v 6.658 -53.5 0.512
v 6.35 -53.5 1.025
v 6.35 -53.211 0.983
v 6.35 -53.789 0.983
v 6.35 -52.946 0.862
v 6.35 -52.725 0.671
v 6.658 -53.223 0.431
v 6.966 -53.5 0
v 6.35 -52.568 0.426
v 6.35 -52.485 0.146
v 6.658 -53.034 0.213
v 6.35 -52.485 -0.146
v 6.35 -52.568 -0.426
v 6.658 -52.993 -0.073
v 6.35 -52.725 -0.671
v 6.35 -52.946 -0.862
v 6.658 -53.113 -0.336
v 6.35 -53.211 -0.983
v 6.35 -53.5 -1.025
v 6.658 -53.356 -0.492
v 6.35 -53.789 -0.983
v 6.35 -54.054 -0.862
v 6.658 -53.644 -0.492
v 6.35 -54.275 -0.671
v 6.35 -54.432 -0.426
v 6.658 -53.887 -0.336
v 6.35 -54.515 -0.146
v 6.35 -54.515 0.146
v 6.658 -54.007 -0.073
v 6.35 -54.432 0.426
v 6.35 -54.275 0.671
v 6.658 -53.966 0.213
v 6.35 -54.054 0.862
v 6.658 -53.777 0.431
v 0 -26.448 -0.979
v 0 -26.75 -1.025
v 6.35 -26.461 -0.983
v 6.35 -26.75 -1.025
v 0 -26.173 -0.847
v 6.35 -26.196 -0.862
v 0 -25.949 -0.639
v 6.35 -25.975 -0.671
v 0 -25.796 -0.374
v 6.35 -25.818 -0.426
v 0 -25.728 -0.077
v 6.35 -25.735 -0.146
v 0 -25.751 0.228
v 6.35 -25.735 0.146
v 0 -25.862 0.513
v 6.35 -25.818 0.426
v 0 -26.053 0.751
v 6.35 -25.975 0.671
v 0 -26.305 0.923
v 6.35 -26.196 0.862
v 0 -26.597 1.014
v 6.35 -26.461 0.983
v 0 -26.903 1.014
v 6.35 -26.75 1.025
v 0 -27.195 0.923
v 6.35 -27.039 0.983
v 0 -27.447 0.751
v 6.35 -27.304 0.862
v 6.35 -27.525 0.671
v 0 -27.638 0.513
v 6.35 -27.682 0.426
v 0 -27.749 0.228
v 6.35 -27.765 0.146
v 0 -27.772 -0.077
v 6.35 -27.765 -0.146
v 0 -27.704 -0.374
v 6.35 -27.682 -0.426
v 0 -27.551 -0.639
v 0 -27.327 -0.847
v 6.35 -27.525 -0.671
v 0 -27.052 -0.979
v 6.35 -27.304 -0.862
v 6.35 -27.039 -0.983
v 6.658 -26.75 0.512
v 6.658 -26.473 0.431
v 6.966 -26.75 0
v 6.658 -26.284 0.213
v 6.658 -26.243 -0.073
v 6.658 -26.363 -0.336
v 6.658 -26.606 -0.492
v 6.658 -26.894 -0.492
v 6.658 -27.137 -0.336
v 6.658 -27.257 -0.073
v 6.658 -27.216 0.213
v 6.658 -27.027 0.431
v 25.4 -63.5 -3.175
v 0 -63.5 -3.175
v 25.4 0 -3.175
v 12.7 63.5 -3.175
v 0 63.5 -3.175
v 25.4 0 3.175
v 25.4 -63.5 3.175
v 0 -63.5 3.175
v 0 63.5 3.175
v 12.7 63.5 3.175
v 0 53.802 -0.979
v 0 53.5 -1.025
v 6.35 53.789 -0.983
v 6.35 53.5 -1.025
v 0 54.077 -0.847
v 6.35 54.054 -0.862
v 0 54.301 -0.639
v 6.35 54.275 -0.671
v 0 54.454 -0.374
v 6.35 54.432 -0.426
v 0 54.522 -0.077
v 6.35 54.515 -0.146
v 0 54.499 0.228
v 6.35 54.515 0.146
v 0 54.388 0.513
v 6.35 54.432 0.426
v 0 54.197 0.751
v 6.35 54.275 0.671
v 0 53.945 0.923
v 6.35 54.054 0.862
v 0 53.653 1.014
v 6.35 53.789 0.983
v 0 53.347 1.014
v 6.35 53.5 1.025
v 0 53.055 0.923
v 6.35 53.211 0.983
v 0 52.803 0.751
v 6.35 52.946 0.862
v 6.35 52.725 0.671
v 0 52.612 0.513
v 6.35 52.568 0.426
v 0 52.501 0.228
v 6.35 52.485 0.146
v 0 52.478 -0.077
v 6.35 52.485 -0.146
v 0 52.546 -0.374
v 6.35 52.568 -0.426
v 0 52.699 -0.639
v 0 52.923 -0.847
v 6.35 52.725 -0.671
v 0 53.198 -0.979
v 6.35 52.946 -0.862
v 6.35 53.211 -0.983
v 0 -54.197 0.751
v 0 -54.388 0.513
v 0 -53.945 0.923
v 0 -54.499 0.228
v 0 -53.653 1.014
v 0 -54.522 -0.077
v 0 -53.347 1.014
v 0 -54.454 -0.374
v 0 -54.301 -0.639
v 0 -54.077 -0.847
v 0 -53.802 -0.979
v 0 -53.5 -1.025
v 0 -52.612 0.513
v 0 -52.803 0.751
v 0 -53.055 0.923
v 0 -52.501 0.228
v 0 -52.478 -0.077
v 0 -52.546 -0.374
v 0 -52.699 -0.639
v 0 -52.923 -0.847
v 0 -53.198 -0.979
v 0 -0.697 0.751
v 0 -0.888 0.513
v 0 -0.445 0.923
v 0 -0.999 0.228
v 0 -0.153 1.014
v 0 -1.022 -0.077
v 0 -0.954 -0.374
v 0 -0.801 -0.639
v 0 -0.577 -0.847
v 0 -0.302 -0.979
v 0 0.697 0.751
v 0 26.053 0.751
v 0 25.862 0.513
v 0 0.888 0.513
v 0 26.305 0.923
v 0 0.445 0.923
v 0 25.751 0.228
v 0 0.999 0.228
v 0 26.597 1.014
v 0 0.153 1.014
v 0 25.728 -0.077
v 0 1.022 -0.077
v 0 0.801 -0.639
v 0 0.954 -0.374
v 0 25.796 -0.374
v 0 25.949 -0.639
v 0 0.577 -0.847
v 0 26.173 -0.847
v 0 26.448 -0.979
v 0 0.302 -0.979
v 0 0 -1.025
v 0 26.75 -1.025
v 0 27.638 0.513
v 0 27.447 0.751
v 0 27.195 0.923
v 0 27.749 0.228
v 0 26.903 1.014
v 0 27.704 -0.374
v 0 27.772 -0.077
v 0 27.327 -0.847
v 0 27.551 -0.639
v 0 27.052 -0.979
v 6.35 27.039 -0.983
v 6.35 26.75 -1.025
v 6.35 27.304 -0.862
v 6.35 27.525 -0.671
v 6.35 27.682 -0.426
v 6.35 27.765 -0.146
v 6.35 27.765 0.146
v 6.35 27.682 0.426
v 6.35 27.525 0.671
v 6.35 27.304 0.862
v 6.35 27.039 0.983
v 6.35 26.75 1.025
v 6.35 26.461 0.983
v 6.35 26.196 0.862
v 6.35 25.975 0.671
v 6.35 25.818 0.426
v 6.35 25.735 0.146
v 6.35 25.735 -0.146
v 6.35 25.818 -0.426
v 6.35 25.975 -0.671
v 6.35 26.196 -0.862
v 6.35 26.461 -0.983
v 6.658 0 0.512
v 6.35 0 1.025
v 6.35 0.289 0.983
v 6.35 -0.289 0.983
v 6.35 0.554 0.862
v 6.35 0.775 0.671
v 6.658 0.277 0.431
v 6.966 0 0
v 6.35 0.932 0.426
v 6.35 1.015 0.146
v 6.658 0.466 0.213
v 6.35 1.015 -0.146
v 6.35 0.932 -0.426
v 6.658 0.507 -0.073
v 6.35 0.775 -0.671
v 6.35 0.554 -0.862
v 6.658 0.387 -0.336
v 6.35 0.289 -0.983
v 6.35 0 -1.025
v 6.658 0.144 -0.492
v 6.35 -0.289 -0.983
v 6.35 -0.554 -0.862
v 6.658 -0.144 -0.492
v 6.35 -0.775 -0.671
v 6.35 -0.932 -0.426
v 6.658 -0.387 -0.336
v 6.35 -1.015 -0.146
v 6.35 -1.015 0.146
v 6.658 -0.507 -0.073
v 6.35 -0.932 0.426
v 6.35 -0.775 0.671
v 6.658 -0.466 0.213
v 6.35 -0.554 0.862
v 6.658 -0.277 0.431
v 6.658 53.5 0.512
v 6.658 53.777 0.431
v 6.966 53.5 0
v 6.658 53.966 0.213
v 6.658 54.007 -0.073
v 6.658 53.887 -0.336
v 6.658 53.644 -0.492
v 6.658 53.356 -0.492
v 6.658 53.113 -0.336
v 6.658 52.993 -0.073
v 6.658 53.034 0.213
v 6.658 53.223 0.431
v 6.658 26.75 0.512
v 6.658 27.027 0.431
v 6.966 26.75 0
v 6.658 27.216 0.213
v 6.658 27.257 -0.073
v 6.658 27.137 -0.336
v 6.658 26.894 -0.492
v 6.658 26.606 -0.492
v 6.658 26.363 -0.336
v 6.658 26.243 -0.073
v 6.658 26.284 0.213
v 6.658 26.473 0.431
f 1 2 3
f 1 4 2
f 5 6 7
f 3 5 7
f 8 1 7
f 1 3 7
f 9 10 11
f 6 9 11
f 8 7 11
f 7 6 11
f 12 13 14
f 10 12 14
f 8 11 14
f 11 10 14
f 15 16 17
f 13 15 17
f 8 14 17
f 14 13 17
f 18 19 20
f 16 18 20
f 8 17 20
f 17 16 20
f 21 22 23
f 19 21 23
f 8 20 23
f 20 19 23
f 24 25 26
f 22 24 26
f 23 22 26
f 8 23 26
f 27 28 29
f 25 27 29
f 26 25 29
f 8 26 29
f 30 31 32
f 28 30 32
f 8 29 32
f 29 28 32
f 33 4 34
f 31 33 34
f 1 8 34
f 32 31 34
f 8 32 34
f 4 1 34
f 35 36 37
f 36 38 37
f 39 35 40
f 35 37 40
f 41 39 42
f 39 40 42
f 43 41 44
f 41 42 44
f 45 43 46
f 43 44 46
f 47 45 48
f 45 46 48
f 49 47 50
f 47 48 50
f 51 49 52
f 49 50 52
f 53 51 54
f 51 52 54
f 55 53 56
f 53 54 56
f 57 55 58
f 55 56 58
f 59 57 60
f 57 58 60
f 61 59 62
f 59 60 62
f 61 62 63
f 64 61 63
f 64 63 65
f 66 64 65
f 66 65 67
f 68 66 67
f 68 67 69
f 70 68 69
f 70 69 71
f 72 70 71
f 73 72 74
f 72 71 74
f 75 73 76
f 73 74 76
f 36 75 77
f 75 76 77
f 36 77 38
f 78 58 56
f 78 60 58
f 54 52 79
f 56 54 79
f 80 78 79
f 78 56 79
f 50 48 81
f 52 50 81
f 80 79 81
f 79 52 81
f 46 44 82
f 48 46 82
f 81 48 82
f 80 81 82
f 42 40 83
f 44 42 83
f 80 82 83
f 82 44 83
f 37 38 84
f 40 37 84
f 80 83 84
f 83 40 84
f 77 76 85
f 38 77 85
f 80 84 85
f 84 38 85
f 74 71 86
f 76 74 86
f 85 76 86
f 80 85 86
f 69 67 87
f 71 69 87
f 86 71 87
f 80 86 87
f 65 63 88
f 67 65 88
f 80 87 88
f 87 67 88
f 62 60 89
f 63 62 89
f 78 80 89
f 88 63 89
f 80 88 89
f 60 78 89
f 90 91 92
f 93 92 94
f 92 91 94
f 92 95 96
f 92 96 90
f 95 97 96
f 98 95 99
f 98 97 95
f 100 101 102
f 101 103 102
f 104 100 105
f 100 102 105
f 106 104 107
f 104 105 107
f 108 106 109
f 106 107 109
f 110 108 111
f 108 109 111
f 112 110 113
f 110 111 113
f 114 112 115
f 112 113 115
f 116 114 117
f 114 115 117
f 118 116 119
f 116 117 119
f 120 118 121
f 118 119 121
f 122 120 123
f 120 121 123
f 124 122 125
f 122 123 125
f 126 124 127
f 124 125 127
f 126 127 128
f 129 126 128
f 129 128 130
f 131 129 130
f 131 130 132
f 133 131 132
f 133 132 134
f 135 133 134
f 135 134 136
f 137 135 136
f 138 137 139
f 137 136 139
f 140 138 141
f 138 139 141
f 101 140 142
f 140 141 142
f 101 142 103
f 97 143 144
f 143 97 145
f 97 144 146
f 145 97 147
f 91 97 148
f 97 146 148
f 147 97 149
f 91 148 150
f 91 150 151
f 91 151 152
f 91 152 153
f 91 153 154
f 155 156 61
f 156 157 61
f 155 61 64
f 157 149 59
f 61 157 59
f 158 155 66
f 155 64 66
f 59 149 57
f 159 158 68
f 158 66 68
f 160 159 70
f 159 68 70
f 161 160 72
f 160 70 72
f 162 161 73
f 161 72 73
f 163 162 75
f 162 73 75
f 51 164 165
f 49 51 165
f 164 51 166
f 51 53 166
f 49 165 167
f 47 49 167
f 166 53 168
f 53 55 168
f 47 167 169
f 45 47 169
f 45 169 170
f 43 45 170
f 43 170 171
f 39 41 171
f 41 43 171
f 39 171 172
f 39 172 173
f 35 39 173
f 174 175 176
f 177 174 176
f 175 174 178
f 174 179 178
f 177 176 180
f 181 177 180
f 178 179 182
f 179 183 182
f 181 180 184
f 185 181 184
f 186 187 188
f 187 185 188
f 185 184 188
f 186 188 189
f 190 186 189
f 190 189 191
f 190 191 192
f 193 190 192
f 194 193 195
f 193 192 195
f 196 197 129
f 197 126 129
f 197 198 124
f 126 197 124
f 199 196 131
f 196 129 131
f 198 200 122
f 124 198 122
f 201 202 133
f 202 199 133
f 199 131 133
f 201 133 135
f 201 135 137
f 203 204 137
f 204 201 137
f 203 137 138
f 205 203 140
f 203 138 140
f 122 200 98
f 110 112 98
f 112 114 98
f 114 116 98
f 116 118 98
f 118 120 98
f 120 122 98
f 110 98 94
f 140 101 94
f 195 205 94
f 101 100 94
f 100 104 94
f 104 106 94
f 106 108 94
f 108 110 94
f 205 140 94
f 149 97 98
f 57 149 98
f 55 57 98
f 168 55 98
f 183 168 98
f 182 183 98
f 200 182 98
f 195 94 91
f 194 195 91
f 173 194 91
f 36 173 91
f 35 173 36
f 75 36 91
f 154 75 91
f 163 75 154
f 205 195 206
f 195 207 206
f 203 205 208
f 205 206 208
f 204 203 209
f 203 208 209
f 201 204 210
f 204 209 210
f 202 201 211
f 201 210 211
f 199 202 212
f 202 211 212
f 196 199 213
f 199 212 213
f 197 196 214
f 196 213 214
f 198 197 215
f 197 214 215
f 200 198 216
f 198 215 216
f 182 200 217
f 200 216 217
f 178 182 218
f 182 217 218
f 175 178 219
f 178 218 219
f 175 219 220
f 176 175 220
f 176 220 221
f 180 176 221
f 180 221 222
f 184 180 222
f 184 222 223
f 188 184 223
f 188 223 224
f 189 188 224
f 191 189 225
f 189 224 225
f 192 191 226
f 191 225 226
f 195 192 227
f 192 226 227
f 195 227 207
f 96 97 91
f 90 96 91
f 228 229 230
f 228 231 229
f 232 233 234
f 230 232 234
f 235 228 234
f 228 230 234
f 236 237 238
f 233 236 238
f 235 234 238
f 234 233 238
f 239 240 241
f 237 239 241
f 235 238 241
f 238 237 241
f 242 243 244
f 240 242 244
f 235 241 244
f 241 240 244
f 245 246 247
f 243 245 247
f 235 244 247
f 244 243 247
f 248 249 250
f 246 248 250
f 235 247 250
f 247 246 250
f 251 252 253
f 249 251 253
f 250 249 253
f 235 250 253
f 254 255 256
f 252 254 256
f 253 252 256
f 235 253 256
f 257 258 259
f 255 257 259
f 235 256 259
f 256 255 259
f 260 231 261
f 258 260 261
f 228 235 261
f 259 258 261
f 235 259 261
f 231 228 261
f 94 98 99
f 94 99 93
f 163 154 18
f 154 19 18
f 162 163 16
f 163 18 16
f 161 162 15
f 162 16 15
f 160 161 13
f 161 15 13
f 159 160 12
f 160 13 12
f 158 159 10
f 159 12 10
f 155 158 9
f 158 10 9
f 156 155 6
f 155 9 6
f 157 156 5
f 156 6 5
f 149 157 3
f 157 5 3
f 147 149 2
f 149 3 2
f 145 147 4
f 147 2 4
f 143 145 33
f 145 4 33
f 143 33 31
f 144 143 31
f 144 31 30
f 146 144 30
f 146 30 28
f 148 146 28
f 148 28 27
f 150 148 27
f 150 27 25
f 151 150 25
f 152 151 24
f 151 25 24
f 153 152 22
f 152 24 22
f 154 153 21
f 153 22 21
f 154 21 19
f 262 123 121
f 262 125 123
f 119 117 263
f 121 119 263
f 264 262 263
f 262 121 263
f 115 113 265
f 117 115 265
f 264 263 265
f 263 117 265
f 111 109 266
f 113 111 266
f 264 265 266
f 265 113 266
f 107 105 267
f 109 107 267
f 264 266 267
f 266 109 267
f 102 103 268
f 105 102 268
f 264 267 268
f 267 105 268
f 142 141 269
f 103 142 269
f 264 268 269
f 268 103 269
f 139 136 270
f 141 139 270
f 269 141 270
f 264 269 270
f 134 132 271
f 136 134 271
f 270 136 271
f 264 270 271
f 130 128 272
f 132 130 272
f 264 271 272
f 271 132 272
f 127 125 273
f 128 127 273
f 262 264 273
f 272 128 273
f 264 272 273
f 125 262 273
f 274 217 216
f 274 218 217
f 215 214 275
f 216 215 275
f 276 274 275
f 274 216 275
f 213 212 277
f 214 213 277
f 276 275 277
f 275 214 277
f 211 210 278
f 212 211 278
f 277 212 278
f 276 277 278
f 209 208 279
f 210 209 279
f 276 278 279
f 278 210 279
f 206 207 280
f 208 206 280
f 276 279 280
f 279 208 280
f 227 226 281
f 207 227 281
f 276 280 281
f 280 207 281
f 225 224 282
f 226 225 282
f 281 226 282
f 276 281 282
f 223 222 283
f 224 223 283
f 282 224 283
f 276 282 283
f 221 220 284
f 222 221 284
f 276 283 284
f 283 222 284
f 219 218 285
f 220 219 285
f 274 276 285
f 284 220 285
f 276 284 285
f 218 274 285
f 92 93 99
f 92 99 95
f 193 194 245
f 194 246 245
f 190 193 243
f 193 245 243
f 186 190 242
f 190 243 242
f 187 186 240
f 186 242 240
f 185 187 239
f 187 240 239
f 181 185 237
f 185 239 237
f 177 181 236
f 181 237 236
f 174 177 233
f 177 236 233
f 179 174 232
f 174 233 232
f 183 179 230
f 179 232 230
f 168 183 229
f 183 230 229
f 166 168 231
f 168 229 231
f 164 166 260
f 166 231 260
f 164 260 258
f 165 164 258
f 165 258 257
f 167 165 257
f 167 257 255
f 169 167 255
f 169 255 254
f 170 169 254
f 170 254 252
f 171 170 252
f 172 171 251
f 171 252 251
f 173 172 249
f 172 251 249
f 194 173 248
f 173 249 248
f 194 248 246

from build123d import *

# Parameters (mm, degrees)
SKETCH1_W                    = 6.35
SKETCH1_H                    = 127
BOSS_EXTRUDE1_DEPTH          = 25.4
M2_5X0_45_TAPPED_HOLE1_D     = 2.05
M2_5X0_45_TAPPED_HOLE1_DEPTH = 6.35
M2_5X0_45_TAPPED_HOLE1_TIP   = 0.615882135
CUT_EXTRUDE1_DEPTH           = 69.685751798
CUT_EXTRUDE1_DEPTH_BACK      = 69.685751798


with BuildPart() as part:
    # Sketch1 → Boss-Extrude1 (new body)
    with BuildSketch(Plane(origin=(0, 0, 0), x_dir=(0, 0, -1), z_dir=(1, 0, 0))):
        Rectangle(SKETCH1_W, SKETCH1_H)
    extrude(amount=BOSS_EXTRUDE1_DEPTH)

    # M2.5x0.45 Tapped Hole1
    with Locations(Plane.ZY):
        with Locations((0, 53.5), (0, 26.75), (0, 0), (0, -26.75), (0, -53.5)):
            Hole(M2_5X0_45_TAPPED_HOLE1_D / 2, depth=M2_5X0_45_TAPPED_HOLE1_DEPTH)
            with Locations((0, 0, -(M2_5X0_45_TAPPED_HOLE1_DEPTH + M2_5X0_45_TAPPED_HOLE1_TIP / 2))):  # 118° drill point
                Cone(0, M2_5X0_45_TAPPED_HOLE1_D / 2, M2_5X0_45_TAPPED_HOLE1_TIP, mode=Mode.SUBTRACT)

    # Sketch4 → Cut-Extrude1 (cut, two sides: drawn at the far end of the back side and taken through both)
    with BuildSketch(Plane.XY.offset(3.175).offset(-CUT_EXTRUDE1_DEPTH_BACK)):
        Polygon((25.4, 63.5), (12.7, 63.5), (25.4, 0), align=None)
    extrude(amount=CUT_EXTRUDE1_DEPTH + CUT_EXTRUDE1_DEPTH_BACK, mode=Mode.SUBTRACT)


solid = part.part
